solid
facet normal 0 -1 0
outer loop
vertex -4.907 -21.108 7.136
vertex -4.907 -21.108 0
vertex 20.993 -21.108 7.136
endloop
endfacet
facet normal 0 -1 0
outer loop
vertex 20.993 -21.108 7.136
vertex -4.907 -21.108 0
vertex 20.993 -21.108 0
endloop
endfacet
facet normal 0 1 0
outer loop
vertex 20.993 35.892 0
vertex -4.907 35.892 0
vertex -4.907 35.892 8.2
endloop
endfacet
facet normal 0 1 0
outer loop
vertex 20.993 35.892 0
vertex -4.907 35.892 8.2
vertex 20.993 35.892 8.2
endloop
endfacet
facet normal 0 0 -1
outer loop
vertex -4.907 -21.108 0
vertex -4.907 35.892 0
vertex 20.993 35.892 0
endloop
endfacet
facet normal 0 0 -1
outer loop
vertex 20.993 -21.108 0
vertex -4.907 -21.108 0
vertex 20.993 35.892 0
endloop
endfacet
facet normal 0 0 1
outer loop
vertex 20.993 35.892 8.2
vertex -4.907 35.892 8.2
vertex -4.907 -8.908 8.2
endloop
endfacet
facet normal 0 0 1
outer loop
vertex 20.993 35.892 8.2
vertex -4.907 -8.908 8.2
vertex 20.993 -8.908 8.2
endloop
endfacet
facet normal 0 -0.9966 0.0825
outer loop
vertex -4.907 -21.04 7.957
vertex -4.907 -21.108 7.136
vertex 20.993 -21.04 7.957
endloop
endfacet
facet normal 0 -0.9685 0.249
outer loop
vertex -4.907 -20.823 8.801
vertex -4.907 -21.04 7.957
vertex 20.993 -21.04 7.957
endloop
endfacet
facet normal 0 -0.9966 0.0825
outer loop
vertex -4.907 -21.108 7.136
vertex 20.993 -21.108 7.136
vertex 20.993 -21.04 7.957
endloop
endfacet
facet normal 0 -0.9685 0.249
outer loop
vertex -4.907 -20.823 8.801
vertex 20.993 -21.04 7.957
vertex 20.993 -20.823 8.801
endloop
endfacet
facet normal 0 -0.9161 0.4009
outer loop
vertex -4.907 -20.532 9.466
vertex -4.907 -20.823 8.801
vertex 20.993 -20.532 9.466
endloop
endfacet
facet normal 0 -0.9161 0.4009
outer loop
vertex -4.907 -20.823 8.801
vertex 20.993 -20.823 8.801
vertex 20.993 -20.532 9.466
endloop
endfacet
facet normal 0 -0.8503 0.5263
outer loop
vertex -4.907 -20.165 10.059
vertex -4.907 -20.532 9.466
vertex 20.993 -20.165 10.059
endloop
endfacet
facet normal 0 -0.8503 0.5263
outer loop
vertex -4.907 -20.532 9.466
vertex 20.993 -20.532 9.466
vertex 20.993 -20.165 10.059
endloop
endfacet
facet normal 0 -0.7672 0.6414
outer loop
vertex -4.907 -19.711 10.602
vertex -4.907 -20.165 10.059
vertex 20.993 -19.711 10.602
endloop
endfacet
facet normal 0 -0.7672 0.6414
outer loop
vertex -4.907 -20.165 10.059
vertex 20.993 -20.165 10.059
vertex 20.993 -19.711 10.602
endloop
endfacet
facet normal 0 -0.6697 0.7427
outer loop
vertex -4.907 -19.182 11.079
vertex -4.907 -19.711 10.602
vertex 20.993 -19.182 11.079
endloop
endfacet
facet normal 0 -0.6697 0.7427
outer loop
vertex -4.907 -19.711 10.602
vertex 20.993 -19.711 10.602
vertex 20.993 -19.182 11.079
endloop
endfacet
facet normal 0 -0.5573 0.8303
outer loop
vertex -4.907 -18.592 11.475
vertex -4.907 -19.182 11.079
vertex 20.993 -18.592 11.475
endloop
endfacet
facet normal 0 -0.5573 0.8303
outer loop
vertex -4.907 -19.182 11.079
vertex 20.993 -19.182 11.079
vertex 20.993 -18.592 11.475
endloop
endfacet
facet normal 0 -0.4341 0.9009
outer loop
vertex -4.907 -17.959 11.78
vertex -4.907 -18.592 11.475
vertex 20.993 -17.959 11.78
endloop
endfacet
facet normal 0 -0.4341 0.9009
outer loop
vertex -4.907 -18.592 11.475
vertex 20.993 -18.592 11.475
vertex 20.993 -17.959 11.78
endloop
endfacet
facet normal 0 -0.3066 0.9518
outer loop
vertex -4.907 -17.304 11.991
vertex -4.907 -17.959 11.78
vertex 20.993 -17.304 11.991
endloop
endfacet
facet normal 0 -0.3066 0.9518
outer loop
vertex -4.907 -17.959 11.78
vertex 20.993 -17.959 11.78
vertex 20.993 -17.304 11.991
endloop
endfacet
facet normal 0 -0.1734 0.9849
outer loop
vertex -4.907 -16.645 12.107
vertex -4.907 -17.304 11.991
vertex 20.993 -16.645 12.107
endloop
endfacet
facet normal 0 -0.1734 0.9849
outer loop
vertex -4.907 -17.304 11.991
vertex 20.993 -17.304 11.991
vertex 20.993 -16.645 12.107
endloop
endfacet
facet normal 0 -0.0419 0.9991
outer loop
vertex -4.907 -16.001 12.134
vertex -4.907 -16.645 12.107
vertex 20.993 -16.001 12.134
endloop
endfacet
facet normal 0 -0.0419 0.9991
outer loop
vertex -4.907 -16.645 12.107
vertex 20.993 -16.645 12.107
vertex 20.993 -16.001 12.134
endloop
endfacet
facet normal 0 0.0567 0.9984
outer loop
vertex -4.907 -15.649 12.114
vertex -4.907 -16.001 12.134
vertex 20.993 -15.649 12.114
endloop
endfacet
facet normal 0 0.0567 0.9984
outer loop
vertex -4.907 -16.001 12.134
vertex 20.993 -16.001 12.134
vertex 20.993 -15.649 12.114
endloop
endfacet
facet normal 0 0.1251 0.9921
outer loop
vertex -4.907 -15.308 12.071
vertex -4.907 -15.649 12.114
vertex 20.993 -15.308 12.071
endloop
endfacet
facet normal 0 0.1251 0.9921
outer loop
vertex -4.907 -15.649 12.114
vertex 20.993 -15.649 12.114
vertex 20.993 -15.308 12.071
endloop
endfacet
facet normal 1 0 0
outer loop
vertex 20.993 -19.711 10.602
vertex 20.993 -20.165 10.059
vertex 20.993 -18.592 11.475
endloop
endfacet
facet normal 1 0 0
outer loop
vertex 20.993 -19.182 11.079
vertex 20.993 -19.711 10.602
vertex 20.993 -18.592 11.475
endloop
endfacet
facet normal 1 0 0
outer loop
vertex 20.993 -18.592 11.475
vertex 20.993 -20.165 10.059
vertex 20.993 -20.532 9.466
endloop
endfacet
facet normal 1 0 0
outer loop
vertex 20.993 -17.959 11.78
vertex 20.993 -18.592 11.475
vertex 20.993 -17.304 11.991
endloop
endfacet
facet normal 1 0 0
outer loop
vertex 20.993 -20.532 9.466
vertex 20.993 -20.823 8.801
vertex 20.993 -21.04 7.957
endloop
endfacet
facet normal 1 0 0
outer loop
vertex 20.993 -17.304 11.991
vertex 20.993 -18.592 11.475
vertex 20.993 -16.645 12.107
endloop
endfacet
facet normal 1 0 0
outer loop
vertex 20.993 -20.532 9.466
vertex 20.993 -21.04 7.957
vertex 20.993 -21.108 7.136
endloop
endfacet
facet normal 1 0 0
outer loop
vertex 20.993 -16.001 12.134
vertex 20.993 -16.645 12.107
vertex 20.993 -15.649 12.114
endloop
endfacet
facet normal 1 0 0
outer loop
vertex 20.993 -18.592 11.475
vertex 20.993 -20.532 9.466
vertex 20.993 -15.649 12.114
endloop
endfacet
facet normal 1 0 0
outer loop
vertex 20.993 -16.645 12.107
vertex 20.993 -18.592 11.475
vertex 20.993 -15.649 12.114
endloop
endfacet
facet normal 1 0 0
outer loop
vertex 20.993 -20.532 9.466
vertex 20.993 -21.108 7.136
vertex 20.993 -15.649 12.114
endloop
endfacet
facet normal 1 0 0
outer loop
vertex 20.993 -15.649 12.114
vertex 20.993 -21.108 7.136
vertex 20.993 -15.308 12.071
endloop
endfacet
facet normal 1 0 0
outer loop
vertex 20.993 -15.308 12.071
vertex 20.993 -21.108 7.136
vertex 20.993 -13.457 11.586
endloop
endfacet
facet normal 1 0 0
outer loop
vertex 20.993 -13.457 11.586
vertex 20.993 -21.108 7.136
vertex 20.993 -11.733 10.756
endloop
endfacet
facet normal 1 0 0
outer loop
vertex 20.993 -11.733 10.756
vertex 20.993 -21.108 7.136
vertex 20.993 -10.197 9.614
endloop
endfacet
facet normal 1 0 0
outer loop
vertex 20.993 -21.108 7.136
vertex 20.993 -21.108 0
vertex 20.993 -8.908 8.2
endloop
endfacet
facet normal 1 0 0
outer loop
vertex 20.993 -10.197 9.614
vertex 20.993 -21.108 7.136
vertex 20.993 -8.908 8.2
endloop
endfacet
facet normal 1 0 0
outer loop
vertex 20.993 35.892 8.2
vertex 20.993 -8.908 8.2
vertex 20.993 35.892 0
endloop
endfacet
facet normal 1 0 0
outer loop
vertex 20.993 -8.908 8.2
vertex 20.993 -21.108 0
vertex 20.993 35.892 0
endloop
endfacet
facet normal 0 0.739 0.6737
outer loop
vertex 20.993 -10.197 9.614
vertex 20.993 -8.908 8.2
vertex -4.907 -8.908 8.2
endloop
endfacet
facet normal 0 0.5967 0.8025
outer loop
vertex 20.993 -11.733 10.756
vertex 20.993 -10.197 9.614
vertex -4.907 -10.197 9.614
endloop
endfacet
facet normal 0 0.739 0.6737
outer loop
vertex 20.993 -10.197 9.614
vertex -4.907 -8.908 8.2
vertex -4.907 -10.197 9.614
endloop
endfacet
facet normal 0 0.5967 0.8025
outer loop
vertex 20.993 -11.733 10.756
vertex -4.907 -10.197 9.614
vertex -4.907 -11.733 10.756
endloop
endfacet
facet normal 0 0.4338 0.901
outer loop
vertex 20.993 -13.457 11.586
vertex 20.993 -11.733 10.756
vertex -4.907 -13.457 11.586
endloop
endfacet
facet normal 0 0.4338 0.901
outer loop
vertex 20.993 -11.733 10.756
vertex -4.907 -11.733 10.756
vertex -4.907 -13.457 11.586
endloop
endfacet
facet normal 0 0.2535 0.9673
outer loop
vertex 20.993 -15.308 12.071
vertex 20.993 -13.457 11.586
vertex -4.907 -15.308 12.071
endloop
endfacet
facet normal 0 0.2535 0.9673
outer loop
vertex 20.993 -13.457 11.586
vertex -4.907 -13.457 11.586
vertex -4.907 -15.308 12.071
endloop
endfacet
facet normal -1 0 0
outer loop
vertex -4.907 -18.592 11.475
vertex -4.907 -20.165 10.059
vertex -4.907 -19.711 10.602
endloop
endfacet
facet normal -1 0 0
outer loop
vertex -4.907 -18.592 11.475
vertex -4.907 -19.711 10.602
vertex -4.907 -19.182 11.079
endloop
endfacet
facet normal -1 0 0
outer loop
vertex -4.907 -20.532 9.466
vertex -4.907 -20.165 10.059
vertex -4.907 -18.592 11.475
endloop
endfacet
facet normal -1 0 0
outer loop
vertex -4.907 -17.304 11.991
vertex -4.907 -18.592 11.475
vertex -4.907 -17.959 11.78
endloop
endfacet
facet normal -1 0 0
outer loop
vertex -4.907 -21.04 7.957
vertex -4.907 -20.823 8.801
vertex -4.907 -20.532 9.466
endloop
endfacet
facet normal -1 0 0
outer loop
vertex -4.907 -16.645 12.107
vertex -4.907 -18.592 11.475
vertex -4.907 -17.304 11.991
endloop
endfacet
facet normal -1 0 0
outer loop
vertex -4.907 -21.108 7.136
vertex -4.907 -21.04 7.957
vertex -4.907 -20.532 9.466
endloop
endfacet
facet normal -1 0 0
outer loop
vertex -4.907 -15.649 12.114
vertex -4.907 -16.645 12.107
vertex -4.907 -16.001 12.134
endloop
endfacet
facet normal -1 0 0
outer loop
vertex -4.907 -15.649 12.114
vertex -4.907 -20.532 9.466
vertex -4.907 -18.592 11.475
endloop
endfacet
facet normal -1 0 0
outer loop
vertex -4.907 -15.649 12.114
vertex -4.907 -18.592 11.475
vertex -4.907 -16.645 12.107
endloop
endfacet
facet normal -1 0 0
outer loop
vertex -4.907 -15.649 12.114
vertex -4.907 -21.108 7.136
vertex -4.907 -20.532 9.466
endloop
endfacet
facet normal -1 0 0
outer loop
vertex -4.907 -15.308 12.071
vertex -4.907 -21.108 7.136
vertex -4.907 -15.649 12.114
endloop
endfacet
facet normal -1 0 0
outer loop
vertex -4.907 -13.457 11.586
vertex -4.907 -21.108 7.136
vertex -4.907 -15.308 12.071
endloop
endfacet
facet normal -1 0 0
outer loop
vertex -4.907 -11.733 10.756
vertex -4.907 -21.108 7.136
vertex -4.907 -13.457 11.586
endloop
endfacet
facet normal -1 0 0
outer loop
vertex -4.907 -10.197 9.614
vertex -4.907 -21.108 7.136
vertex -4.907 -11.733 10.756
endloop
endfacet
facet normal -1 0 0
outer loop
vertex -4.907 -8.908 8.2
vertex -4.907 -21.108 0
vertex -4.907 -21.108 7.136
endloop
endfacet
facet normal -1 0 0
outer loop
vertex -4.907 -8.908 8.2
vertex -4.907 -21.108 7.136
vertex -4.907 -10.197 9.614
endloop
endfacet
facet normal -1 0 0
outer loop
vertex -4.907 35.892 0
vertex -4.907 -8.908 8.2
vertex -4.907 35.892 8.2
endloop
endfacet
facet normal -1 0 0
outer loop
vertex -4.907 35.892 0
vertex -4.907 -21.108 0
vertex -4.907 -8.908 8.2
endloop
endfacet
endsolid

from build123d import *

# Parameters (mm, degrees)
F0_W        = 25.9
F0_H        = 57
F1_DEPTH    = 8.2
F2_W        = 25.9
F2_H        = 12.2
F3_DEPTH    = 4
F4_T1_DEPTH = 65.9
F5_R        = 5


# Not quite as in the source:
# - a fillet or chamfer that OpenCascade refuses, or shapes differently, is made with other operations: its cross-section is extruded or revolved along the edge and cut away or added


with BuildPart() as f1:
    # F0 (on Top) → F1 (new body)
    with BuildSketch(Plane.XY):
        with Locations((8.0425532069, 7.3918554072)):
            Rectangle(F0_W, F0_H)
    extrude(amount=F1_DEPTH)

    # F2 (on face) → F3 (join)
    with BuildSketch(Plane.XY.offset(8.2)):
        with Locations((8.0425532069, -15.0081445928)):
            Rectangle(F2_W, F2_H)
    extrude(amount=F3_DEPTH)

    # F4: fillet of radius 10 on 1 edges, made by hand

    # F4_s2 → F4_t1 (cut)
    with BuildSketch(Plane.YZ.offset(-24.9074467931)):
        with BuildLine():
            ThreePointArc((-8.9081445928, 8.2), (-12.4360086378, 11.14427191), (-16.9081445928, 12.2))
            Line((-16.9081445928, 12.2), (-8.9081445928, 12.2))
            Line((-8.9081445928, 12.2), (-8.9081445928, 8.2))
        make_face()
    extrude(amount=F4_T1_DEPTH, mode=Mode.SUBTRACT)

    # F5
    f5_edges = [f1.edges().sort_by_distance(p)[0] for p in [
        (8.042553, -21.108145, 12.2),
    ]]
    fillet(f5_edges, radius=F5_R)


solid = f1.part
